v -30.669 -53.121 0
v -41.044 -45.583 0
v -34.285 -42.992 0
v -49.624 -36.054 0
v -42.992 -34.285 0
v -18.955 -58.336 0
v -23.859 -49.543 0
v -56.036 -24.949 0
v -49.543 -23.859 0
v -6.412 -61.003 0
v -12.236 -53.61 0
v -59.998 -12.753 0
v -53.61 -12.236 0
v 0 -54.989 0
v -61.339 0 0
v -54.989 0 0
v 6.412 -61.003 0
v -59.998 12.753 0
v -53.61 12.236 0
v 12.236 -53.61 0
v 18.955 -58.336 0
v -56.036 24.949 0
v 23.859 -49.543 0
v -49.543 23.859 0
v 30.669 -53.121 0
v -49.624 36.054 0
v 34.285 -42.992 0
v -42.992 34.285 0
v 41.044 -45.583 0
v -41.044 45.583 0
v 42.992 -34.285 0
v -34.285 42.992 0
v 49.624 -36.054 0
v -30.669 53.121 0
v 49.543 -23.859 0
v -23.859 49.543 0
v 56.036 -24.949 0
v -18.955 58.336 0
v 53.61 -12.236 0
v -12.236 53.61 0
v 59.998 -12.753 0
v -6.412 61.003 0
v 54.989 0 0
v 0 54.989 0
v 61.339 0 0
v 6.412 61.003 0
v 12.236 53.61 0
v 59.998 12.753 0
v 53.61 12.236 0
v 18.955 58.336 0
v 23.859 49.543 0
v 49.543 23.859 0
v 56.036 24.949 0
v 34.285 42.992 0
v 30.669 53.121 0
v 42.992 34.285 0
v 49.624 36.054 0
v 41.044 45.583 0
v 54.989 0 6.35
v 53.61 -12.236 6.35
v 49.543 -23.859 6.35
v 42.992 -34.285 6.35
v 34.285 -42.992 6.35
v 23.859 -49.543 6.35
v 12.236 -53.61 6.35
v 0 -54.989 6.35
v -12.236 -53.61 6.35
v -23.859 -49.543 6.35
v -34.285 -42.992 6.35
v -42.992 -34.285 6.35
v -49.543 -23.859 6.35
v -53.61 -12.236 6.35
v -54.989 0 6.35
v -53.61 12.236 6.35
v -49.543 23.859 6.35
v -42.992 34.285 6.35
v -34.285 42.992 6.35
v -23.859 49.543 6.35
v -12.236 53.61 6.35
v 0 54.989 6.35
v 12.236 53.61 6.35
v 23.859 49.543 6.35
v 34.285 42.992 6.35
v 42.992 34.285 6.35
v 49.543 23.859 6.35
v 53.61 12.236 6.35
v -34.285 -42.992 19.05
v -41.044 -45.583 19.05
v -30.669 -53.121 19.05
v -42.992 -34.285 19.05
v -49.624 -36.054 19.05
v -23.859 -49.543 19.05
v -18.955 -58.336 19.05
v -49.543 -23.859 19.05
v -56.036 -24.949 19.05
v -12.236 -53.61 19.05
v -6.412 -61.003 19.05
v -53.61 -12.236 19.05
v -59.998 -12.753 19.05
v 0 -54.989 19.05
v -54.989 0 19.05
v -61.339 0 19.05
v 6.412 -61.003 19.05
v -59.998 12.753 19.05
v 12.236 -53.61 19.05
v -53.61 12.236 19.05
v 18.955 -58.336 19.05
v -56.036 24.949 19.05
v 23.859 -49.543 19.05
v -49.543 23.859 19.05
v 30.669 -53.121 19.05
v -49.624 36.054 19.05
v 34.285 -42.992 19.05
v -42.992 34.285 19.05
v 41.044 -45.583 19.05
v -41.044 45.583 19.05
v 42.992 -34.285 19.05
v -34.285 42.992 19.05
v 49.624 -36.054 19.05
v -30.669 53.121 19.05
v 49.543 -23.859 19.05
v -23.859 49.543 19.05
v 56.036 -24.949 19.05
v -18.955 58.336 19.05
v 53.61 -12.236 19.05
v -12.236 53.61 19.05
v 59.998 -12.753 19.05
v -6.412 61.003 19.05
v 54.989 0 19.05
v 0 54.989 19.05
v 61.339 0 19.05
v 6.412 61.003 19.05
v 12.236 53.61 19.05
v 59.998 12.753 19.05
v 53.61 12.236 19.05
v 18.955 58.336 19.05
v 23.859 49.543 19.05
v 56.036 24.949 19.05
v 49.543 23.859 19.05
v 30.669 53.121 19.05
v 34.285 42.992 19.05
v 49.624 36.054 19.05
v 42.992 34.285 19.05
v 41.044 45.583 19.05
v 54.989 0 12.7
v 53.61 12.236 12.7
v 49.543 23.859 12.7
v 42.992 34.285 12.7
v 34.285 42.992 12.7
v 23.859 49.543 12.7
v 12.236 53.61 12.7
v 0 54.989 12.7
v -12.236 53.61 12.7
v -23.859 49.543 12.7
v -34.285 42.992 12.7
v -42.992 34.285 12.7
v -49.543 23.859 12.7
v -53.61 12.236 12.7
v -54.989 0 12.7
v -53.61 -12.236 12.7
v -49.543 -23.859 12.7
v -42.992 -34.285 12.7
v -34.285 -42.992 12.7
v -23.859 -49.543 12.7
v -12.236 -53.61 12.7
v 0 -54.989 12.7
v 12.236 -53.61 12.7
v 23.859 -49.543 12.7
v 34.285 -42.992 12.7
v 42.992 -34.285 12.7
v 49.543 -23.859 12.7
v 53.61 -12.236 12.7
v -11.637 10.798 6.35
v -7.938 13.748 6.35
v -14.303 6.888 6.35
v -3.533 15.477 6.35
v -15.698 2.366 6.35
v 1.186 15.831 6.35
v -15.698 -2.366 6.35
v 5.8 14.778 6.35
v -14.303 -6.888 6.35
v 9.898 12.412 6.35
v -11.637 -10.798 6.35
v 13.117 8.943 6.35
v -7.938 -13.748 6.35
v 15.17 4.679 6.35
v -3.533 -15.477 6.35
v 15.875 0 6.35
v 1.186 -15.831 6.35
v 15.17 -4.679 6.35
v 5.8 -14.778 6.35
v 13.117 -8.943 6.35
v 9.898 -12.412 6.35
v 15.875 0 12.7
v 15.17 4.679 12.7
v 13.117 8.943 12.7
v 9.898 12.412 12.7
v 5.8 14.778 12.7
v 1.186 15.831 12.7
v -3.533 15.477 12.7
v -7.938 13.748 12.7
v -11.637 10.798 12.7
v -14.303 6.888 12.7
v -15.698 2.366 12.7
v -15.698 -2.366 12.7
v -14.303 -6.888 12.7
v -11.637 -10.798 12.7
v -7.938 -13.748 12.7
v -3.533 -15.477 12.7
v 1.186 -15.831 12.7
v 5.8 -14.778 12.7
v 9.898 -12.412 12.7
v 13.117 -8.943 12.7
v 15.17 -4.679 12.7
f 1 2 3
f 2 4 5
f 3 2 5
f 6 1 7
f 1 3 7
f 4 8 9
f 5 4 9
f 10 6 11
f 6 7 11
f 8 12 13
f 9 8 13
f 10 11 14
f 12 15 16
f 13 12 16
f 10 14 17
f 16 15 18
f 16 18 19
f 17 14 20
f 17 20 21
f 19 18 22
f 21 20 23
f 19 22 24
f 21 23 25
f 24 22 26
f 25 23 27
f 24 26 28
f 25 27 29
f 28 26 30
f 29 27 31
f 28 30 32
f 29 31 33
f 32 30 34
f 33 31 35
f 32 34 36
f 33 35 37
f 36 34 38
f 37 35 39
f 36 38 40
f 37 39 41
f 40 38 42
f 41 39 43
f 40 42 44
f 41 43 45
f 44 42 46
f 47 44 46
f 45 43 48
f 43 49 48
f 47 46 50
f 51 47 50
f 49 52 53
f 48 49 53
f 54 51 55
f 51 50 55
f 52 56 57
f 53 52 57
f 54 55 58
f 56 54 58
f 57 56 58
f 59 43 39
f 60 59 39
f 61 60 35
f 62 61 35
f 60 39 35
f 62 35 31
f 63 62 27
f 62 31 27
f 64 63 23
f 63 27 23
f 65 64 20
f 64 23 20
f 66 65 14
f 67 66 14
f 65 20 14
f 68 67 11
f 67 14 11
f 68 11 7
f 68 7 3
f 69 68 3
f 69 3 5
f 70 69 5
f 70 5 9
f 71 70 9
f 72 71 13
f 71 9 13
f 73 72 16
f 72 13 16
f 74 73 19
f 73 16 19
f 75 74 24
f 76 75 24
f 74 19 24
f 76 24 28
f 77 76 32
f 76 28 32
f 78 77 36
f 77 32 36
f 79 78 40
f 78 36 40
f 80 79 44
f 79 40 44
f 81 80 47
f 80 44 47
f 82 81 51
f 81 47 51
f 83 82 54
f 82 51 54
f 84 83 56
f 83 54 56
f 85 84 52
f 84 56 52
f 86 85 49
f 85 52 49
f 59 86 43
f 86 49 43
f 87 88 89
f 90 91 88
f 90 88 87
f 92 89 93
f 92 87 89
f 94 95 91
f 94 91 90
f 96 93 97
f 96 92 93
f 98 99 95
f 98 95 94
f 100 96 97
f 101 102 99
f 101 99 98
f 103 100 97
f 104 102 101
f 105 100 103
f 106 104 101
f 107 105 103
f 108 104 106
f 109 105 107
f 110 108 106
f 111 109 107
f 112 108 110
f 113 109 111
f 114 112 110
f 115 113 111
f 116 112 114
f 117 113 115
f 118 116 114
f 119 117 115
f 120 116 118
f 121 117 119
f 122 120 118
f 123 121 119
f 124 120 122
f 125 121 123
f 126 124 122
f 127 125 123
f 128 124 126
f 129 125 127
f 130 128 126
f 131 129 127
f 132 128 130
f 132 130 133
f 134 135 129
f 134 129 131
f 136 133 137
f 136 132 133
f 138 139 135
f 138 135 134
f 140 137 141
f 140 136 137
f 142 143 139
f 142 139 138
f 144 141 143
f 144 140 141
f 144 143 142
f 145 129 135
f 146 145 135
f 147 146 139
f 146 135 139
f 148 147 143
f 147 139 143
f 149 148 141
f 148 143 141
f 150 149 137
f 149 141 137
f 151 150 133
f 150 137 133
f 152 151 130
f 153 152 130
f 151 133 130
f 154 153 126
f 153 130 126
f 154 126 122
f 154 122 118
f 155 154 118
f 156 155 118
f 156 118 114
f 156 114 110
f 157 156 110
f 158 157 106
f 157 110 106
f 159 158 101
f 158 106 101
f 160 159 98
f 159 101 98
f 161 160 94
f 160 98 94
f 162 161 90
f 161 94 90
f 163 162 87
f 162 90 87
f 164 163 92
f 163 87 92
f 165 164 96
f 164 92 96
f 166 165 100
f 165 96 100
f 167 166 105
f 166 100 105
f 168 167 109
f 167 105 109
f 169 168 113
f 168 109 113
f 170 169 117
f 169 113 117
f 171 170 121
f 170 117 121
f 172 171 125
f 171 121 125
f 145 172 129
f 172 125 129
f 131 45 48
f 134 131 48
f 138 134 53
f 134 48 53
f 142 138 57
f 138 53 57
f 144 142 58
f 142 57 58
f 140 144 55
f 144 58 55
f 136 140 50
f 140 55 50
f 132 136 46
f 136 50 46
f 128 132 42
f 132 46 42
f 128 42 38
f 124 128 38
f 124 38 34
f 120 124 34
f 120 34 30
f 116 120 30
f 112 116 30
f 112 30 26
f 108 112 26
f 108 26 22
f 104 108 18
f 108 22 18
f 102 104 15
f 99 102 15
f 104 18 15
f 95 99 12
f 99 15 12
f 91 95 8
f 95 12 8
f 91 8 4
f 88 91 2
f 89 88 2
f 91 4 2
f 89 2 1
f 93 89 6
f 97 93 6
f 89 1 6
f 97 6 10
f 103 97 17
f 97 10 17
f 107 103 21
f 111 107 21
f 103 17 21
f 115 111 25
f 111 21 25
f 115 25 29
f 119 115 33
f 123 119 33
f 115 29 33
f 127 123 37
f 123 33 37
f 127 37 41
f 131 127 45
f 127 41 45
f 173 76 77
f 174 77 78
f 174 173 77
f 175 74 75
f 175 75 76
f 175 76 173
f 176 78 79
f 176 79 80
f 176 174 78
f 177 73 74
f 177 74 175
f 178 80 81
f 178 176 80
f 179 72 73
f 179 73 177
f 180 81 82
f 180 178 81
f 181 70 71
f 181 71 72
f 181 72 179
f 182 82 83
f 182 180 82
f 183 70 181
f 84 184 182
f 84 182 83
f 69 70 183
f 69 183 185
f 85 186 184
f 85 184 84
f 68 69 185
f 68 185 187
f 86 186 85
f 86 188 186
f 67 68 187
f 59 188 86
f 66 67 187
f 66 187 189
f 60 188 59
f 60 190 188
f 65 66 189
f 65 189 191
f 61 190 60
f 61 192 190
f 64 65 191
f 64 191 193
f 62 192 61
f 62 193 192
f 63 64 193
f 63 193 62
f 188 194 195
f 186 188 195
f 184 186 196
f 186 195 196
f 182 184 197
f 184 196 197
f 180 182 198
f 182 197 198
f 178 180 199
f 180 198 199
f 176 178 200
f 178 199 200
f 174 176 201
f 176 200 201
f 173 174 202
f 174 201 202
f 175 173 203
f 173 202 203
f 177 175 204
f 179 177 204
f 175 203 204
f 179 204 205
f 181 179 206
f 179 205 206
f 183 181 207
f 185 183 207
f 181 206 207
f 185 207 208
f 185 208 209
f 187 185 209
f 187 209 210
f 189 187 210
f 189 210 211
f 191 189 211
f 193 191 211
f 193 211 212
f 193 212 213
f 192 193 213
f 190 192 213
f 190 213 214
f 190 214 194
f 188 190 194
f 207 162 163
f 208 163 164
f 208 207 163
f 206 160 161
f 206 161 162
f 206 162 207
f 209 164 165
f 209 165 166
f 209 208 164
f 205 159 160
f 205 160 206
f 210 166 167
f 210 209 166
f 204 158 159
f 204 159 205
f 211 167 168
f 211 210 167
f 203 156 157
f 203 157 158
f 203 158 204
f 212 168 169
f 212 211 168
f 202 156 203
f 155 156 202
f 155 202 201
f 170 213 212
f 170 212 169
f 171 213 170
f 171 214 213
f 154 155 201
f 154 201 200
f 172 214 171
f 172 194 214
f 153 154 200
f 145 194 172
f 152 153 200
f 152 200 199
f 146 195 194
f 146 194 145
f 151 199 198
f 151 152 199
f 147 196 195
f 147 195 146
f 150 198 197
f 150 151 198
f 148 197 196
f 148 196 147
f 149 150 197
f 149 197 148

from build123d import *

# Parameters (mm, degrees)
F0_R     = 61.338587
F1_DEPTH = 19.05
F2_R     = 54.988587
F3_DEPTH = 6.35
F4_R     = 54.988587
F5_DEPTH = 6.35
F6_R     = 15.875
F7_DEPTH = 12.701


with BuildPart() as f1:
    # F0 (on Top) → F1 (new body)
    with BuildSketch(Plane.XY):
        Circle(F0_R)
    extrude(amount=F1_DEPTH)

    # F2 (on face) → F3 (cut)
    with BuildSketch(Plane(origin=(0, 0, 0), x_dir=(1, 0, 0), z_dir=(0, 0, -1))):
        Circle(F2_R)
    extrude(amount=-F3_DEPTH, mode=Mode.SUBTRACT)

    # F4 (on face) → F5 (cut)
    with BuildSketch(Plane.XY.offset(19.05)):
        Circle(F4_R)
    extrude(amount=-F5_DEPTH, mode=Mode.SUBTRACT)

    # F6 (on face) → F7 (cut, through all)
    with BuildSketch(Plane.XY.offset(12.7)):
        Circle(F6_R)
    extrude(amount=-F7_DEPTH, mode=Mode.SUBTRACT)


solid = f1.part
